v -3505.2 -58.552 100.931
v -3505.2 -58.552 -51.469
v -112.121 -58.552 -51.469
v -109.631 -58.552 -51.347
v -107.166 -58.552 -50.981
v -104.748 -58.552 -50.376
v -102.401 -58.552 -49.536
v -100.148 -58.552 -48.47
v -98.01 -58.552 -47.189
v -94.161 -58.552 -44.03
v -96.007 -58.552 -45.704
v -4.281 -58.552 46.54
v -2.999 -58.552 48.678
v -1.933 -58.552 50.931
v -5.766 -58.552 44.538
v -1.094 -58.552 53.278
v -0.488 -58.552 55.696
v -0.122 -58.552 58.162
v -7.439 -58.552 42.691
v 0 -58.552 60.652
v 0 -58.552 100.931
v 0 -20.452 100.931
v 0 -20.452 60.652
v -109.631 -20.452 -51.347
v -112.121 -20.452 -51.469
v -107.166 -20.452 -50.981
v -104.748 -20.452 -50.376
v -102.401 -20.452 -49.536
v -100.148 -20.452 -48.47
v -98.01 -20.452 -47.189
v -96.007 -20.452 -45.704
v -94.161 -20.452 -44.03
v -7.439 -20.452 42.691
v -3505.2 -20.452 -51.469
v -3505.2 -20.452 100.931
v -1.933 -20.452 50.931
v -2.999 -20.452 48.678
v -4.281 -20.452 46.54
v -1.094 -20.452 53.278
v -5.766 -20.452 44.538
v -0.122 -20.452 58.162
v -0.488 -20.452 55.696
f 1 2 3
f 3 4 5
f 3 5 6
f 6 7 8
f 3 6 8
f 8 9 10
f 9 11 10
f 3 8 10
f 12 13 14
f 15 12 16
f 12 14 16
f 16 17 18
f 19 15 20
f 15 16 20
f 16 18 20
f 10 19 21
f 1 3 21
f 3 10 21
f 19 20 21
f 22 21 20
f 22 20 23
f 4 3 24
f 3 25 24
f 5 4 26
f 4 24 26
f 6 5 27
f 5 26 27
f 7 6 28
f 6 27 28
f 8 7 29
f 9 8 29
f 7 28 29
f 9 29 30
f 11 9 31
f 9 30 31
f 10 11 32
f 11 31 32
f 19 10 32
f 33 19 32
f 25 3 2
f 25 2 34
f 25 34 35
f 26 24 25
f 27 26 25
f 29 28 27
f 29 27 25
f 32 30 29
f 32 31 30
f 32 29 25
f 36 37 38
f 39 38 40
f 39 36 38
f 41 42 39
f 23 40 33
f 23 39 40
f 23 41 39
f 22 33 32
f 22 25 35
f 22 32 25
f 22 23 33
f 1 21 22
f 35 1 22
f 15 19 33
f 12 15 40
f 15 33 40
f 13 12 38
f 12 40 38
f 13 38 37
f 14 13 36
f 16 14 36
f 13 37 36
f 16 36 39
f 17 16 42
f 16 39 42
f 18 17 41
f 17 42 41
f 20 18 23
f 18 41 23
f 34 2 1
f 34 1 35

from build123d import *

# Parameters (mm, degrees)
F0_W     = 38.1
F0_H     = 152.4
F1_DEPTH = 3505.2
F2_SIZE  = 101.6
F3_R     = 25.4


with BuildPart() as f1:
    # F0 (on Right) → F1 (new body)
    with BuildSketch(Plane.YZ):
        with Locations((-39.5023208112, 24.7306000911)):
            Rectangle(F0_W, F0_H)
    extrude(amount=-F1_DEPTH)

    # F2
    f2_edges = [f1.edges().sort_by_distance(p)[0] for p in [
        (0, -39.502321, -51.4694),
    ]]
    chamfer(f2_edges, length=F2_SIZE)

    # F3
    f3_edges = [f1.edges().sort_by_distance(p)[0] for p in [
        (0, -39.502321, 50.1306),
        (-101.6, -39.502321, -51.4694),
    ]]
    fillet(f3_edges, radius=F3_R)


solid = f1.part
